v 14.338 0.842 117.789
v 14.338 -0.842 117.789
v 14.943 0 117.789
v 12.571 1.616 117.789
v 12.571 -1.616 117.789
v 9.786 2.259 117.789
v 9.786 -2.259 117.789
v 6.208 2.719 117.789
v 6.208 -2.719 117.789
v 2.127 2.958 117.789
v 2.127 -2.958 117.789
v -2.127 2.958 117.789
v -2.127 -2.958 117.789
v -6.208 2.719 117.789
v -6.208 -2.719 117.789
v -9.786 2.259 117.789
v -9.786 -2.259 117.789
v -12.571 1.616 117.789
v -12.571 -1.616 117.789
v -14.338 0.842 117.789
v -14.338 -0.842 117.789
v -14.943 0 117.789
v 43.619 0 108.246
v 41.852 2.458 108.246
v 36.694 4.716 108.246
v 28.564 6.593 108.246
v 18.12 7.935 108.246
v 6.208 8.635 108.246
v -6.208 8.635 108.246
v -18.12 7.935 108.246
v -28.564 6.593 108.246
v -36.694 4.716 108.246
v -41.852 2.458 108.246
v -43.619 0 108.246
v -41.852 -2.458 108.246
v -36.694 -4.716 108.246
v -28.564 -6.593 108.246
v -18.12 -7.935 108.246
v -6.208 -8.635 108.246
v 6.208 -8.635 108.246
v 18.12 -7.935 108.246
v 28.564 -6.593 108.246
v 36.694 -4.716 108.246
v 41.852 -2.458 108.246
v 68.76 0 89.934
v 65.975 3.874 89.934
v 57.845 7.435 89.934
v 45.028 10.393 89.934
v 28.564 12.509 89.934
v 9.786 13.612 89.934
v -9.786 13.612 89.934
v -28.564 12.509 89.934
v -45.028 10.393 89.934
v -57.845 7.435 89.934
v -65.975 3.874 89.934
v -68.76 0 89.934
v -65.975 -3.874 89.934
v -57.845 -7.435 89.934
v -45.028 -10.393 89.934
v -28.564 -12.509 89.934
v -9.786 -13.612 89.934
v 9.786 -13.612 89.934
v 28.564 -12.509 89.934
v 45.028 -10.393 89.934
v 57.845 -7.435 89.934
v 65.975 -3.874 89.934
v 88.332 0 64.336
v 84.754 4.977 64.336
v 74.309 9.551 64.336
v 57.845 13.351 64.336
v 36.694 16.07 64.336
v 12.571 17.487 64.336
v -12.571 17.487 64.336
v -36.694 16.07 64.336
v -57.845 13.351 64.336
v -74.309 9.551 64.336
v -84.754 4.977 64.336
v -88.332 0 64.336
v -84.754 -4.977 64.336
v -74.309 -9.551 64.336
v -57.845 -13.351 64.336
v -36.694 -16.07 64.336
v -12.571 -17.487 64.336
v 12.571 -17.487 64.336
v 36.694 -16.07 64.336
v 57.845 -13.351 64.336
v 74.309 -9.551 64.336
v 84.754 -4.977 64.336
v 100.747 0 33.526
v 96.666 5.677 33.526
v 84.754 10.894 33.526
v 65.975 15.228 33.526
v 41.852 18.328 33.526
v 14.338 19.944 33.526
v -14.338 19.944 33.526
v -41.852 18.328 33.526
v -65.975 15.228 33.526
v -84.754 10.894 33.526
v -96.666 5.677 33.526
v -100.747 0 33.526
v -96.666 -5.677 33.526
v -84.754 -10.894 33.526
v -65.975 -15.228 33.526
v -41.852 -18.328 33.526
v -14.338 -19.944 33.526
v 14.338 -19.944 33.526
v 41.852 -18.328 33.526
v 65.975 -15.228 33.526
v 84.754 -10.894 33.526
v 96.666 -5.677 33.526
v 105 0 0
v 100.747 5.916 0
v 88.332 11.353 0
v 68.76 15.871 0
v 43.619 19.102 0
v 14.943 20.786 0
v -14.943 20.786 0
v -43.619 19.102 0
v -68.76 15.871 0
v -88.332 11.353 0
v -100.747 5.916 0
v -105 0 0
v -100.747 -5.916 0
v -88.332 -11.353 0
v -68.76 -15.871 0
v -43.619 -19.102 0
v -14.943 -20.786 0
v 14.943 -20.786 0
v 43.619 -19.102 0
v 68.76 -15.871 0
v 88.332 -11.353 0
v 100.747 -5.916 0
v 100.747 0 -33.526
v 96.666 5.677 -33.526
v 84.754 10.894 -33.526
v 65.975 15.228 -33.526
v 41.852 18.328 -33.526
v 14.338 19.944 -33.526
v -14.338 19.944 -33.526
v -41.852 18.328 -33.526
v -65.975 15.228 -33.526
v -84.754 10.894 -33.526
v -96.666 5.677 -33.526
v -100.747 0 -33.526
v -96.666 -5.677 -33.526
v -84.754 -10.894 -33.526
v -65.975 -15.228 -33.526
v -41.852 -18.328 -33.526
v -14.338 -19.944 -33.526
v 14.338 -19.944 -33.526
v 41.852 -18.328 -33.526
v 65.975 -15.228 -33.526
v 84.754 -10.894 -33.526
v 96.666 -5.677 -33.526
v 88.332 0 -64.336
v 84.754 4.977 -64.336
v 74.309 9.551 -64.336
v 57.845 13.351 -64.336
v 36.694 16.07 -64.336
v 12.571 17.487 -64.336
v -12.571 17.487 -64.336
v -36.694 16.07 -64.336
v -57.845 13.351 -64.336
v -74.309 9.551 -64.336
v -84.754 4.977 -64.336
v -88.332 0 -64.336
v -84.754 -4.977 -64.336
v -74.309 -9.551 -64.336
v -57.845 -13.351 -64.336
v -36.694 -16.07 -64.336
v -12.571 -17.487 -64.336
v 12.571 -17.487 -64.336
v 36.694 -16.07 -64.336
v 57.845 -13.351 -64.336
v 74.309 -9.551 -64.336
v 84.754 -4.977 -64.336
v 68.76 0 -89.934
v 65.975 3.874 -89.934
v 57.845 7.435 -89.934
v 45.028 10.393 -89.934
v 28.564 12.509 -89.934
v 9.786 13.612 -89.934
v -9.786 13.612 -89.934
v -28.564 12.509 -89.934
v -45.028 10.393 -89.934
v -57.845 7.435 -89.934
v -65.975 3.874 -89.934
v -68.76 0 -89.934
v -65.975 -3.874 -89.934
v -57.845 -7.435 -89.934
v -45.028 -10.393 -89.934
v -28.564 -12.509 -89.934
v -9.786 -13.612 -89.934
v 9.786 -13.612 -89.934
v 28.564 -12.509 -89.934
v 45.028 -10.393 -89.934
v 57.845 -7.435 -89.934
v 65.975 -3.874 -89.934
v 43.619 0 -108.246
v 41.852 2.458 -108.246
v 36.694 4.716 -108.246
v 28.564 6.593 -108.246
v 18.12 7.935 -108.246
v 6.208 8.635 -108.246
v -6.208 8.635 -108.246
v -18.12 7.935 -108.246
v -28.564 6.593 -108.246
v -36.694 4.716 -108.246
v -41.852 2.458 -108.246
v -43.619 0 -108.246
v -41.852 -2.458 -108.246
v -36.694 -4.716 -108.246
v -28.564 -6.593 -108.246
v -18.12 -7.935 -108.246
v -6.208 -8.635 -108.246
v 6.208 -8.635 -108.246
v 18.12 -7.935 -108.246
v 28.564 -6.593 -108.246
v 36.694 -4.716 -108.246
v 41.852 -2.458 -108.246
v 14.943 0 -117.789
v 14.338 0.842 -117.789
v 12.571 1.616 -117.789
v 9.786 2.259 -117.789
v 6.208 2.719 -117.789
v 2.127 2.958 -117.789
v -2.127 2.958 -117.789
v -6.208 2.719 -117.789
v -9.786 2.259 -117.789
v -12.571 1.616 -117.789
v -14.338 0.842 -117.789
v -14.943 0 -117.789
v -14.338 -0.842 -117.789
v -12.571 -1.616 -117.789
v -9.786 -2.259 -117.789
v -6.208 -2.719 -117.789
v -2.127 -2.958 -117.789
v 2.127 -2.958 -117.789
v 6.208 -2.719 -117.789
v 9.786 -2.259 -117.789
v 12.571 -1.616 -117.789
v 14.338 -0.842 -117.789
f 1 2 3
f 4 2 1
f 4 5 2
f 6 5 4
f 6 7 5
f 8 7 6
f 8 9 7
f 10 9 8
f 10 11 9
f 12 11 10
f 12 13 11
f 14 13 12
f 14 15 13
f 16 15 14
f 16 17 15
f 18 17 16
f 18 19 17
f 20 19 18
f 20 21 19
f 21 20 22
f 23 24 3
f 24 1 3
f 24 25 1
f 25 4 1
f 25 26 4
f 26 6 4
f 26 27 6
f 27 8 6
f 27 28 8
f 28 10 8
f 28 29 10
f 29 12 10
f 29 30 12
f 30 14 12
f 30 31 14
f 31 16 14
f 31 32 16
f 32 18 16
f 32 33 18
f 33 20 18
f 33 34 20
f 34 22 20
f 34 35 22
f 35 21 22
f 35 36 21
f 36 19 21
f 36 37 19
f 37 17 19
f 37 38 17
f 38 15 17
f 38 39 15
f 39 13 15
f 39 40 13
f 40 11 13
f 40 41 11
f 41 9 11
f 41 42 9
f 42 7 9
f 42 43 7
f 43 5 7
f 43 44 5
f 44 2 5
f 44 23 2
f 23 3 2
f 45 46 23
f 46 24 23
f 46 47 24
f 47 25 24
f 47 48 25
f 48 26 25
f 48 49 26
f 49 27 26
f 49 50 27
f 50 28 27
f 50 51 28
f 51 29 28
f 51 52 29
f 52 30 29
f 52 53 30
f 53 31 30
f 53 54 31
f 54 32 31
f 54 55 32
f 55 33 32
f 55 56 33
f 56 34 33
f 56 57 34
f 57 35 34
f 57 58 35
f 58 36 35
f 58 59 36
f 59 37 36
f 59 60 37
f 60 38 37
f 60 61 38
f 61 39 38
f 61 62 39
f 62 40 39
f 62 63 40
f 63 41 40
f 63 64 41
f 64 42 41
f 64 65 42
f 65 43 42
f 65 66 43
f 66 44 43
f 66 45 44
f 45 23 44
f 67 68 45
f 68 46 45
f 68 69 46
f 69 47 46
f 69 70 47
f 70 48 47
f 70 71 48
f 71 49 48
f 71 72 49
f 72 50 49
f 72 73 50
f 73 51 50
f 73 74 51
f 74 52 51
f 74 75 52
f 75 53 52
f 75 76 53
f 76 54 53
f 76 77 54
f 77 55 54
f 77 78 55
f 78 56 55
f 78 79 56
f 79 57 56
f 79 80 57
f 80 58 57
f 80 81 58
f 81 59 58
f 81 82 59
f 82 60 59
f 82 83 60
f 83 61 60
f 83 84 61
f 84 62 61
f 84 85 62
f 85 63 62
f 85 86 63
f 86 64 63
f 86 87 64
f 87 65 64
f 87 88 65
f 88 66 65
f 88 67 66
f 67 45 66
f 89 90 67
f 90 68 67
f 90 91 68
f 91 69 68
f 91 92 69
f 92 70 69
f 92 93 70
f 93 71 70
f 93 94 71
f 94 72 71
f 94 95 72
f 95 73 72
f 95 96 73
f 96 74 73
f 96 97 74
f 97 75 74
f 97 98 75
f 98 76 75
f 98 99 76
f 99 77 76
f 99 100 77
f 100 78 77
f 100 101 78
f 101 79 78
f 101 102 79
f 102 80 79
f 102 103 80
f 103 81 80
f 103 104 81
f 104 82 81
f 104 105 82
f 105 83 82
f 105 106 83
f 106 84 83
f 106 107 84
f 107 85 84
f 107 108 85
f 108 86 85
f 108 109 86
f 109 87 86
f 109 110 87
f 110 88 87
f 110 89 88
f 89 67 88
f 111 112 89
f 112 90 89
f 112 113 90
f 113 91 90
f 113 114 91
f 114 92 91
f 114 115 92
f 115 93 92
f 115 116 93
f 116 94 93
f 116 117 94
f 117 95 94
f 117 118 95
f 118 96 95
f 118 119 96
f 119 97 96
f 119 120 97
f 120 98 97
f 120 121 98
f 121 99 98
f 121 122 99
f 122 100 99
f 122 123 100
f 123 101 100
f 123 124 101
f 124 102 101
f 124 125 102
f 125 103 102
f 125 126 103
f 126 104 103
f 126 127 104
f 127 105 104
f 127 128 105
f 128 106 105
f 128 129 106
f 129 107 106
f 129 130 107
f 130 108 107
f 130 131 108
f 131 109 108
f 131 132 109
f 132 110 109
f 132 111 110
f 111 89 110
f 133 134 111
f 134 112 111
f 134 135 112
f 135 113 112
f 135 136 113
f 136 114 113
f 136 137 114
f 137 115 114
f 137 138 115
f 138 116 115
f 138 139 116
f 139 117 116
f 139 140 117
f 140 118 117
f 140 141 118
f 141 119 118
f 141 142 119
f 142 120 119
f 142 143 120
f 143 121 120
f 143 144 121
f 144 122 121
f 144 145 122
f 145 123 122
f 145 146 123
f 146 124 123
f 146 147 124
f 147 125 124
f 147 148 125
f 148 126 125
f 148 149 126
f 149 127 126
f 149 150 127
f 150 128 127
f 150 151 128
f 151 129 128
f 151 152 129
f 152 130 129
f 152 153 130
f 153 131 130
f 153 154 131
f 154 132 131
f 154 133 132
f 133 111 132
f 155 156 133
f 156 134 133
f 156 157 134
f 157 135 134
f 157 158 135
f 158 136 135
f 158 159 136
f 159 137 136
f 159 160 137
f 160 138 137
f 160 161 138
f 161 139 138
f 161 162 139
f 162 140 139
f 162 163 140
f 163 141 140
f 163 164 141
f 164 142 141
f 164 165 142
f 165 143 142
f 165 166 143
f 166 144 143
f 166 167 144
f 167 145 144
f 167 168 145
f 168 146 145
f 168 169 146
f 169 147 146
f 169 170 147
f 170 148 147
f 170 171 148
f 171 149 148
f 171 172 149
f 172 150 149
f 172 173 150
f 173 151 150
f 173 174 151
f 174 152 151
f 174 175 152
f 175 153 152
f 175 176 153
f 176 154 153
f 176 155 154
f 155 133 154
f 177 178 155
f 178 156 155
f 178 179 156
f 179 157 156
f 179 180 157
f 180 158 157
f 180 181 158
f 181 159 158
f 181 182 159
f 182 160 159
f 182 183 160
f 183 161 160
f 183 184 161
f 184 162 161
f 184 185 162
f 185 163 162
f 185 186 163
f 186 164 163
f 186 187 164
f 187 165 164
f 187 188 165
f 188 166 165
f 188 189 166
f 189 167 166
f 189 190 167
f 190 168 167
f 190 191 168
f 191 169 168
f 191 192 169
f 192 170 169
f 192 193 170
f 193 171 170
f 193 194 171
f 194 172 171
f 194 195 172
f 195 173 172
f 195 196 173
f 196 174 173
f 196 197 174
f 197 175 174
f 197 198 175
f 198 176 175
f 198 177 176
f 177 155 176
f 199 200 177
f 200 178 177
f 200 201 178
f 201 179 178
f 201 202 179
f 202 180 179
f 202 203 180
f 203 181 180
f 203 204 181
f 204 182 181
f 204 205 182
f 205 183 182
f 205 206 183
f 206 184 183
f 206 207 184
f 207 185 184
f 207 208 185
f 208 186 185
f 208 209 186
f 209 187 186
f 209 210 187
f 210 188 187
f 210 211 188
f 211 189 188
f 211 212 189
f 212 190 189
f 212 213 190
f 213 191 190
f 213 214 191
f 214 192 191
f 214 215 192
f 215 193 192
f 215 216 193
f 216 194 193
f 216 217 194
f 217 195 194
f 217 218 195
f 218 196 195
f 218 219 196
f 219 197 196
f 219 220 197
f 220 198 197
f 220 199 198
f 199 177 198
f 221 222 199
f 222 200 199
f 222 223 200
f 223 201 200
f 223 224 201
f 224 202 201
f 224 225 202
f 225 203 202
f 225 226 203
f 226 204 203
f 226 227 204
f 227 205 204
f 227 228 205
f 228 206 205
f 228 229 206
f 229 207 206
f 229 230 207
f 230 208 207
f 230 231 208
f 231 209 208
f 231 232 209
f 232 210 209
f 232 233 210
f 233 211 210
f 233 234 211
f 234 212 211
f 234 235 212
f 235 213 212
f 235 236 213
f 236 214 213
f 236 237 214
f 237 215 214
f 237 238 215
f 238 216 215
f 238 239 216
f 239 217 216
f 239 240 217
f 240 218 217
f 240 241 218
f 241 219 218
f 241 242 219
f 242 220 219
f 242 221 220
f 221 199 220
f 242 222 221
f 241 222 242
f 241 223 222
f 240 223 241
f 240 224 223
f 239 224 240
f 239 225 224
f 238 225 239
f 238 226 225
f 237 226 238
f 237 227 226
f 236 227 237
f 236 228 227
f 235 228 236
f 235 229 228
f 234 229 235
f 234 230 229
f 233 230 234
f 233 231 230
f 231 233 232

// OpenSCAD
// Generated by SolidPython 1.0.1 on 2020-07-29 00:46:51


scale(v = [15, 3, 17]) {
	sphere(r = 7);
}
/***********************************************
*********      SolidPython code:      **********
************************************************
 
# import packages: SolidPython
from solid import *
from solid.utils import *
from itertools import chain, combinations, permutations


class Resize:

    def __init__(self, scad_file):
        self.scad_file = scad_file
        #self.scad_file = import_scad(scad_file)
        # cone/cylinder param:
        self.r1 = 0
        self.r2 = 0
        self.h = 0
        # rectangular prism param:
        self.w = 0
        self.l = 0
        # ellipse param:
        self.r = 0

    # import OpenScad code (file name corresponds to shape)


    # classify shape + parameters
    def assign(self, param1, param2, param3):
        if self.scad_file == 'cone.scad':
            self.r1 = param1
            self.r2 = param2
            self.h = param3
        elif self.scad_file == 'cylinder.scad':
            self.r1 = param1
            self.r2 = param2
            self.h = param3
        elif self.scad_file == 'rectangularPrism.scad':
            self.h = param1
            self.l = param2
            self.w = param3
        else:
            self.r = param1
            self.h = param2

    # resize parameters
    def iterate(self):
        x = range(3, 20, 2)
        i = 1
        if self.scad_file == 'cone.scad':
            tempList = list(permutations(x, 2))
            for temp in tempList:
                param1 = temp[0]
                param2 = temp[1]
                filepath = 'produced_scad_files/' + 'cone' + str(param1) + '_' + str(param2) + '_' + '.scad'
                scad_render_to_file(cylinder(h=param1, r1=param2, r2=0), filepath)

        elif self.scad_file == 'cylinder.scad':
            tempList = list(permutations(x, 3))
            for temp in tempList:
                param1 = temp[0]
                param2 = temp[1]
                filepath = 'produced_scad_files/' + 'cylinder' + str(param1) + '_' + str(param2) + '_' + '.scad'
                scad_render_to_file(cylinder(h=param1, r1=param2, r2=param2), filepath)

        elif self.scad_file == 'rectangularPrism.scad':
            tempList = list(permutations(x, 3))
            for temp in tempList:
                param1 = temp[0]
                param2 = temp[1]
                param3 = temp[2]
                filepath = 'produced_scad_files/' + 'rectangularPrism' + str(param1) + '_' + str(param2) + '_' + str(
                    param3) + '.scad'
                scad_render_to_file(cube(size=(param1, param2, param3)), filepath)

        elif self.scad_file == 'ellipse.scad':
            tempList = list(permutations(x, 4))
            for temp in tempList:
                param1 = temp[0]
                param2 = temp[1]
                param3 = temp[2]
                param4 = temp[3]
                filepath = 'produced_scad_files/' + 'ellipse' + str(param1) + '_' + str(param2) + '_' + str(param3) + '_' + str(param4) + '.scad'
                scad_render_to_file(scale([param1, param2, param3])(sphere(r=param4)), filepath)

    def render_to_scadfile(self):
        scad_render_to_file(scad, 'example.scad') 
 
************************************************/
